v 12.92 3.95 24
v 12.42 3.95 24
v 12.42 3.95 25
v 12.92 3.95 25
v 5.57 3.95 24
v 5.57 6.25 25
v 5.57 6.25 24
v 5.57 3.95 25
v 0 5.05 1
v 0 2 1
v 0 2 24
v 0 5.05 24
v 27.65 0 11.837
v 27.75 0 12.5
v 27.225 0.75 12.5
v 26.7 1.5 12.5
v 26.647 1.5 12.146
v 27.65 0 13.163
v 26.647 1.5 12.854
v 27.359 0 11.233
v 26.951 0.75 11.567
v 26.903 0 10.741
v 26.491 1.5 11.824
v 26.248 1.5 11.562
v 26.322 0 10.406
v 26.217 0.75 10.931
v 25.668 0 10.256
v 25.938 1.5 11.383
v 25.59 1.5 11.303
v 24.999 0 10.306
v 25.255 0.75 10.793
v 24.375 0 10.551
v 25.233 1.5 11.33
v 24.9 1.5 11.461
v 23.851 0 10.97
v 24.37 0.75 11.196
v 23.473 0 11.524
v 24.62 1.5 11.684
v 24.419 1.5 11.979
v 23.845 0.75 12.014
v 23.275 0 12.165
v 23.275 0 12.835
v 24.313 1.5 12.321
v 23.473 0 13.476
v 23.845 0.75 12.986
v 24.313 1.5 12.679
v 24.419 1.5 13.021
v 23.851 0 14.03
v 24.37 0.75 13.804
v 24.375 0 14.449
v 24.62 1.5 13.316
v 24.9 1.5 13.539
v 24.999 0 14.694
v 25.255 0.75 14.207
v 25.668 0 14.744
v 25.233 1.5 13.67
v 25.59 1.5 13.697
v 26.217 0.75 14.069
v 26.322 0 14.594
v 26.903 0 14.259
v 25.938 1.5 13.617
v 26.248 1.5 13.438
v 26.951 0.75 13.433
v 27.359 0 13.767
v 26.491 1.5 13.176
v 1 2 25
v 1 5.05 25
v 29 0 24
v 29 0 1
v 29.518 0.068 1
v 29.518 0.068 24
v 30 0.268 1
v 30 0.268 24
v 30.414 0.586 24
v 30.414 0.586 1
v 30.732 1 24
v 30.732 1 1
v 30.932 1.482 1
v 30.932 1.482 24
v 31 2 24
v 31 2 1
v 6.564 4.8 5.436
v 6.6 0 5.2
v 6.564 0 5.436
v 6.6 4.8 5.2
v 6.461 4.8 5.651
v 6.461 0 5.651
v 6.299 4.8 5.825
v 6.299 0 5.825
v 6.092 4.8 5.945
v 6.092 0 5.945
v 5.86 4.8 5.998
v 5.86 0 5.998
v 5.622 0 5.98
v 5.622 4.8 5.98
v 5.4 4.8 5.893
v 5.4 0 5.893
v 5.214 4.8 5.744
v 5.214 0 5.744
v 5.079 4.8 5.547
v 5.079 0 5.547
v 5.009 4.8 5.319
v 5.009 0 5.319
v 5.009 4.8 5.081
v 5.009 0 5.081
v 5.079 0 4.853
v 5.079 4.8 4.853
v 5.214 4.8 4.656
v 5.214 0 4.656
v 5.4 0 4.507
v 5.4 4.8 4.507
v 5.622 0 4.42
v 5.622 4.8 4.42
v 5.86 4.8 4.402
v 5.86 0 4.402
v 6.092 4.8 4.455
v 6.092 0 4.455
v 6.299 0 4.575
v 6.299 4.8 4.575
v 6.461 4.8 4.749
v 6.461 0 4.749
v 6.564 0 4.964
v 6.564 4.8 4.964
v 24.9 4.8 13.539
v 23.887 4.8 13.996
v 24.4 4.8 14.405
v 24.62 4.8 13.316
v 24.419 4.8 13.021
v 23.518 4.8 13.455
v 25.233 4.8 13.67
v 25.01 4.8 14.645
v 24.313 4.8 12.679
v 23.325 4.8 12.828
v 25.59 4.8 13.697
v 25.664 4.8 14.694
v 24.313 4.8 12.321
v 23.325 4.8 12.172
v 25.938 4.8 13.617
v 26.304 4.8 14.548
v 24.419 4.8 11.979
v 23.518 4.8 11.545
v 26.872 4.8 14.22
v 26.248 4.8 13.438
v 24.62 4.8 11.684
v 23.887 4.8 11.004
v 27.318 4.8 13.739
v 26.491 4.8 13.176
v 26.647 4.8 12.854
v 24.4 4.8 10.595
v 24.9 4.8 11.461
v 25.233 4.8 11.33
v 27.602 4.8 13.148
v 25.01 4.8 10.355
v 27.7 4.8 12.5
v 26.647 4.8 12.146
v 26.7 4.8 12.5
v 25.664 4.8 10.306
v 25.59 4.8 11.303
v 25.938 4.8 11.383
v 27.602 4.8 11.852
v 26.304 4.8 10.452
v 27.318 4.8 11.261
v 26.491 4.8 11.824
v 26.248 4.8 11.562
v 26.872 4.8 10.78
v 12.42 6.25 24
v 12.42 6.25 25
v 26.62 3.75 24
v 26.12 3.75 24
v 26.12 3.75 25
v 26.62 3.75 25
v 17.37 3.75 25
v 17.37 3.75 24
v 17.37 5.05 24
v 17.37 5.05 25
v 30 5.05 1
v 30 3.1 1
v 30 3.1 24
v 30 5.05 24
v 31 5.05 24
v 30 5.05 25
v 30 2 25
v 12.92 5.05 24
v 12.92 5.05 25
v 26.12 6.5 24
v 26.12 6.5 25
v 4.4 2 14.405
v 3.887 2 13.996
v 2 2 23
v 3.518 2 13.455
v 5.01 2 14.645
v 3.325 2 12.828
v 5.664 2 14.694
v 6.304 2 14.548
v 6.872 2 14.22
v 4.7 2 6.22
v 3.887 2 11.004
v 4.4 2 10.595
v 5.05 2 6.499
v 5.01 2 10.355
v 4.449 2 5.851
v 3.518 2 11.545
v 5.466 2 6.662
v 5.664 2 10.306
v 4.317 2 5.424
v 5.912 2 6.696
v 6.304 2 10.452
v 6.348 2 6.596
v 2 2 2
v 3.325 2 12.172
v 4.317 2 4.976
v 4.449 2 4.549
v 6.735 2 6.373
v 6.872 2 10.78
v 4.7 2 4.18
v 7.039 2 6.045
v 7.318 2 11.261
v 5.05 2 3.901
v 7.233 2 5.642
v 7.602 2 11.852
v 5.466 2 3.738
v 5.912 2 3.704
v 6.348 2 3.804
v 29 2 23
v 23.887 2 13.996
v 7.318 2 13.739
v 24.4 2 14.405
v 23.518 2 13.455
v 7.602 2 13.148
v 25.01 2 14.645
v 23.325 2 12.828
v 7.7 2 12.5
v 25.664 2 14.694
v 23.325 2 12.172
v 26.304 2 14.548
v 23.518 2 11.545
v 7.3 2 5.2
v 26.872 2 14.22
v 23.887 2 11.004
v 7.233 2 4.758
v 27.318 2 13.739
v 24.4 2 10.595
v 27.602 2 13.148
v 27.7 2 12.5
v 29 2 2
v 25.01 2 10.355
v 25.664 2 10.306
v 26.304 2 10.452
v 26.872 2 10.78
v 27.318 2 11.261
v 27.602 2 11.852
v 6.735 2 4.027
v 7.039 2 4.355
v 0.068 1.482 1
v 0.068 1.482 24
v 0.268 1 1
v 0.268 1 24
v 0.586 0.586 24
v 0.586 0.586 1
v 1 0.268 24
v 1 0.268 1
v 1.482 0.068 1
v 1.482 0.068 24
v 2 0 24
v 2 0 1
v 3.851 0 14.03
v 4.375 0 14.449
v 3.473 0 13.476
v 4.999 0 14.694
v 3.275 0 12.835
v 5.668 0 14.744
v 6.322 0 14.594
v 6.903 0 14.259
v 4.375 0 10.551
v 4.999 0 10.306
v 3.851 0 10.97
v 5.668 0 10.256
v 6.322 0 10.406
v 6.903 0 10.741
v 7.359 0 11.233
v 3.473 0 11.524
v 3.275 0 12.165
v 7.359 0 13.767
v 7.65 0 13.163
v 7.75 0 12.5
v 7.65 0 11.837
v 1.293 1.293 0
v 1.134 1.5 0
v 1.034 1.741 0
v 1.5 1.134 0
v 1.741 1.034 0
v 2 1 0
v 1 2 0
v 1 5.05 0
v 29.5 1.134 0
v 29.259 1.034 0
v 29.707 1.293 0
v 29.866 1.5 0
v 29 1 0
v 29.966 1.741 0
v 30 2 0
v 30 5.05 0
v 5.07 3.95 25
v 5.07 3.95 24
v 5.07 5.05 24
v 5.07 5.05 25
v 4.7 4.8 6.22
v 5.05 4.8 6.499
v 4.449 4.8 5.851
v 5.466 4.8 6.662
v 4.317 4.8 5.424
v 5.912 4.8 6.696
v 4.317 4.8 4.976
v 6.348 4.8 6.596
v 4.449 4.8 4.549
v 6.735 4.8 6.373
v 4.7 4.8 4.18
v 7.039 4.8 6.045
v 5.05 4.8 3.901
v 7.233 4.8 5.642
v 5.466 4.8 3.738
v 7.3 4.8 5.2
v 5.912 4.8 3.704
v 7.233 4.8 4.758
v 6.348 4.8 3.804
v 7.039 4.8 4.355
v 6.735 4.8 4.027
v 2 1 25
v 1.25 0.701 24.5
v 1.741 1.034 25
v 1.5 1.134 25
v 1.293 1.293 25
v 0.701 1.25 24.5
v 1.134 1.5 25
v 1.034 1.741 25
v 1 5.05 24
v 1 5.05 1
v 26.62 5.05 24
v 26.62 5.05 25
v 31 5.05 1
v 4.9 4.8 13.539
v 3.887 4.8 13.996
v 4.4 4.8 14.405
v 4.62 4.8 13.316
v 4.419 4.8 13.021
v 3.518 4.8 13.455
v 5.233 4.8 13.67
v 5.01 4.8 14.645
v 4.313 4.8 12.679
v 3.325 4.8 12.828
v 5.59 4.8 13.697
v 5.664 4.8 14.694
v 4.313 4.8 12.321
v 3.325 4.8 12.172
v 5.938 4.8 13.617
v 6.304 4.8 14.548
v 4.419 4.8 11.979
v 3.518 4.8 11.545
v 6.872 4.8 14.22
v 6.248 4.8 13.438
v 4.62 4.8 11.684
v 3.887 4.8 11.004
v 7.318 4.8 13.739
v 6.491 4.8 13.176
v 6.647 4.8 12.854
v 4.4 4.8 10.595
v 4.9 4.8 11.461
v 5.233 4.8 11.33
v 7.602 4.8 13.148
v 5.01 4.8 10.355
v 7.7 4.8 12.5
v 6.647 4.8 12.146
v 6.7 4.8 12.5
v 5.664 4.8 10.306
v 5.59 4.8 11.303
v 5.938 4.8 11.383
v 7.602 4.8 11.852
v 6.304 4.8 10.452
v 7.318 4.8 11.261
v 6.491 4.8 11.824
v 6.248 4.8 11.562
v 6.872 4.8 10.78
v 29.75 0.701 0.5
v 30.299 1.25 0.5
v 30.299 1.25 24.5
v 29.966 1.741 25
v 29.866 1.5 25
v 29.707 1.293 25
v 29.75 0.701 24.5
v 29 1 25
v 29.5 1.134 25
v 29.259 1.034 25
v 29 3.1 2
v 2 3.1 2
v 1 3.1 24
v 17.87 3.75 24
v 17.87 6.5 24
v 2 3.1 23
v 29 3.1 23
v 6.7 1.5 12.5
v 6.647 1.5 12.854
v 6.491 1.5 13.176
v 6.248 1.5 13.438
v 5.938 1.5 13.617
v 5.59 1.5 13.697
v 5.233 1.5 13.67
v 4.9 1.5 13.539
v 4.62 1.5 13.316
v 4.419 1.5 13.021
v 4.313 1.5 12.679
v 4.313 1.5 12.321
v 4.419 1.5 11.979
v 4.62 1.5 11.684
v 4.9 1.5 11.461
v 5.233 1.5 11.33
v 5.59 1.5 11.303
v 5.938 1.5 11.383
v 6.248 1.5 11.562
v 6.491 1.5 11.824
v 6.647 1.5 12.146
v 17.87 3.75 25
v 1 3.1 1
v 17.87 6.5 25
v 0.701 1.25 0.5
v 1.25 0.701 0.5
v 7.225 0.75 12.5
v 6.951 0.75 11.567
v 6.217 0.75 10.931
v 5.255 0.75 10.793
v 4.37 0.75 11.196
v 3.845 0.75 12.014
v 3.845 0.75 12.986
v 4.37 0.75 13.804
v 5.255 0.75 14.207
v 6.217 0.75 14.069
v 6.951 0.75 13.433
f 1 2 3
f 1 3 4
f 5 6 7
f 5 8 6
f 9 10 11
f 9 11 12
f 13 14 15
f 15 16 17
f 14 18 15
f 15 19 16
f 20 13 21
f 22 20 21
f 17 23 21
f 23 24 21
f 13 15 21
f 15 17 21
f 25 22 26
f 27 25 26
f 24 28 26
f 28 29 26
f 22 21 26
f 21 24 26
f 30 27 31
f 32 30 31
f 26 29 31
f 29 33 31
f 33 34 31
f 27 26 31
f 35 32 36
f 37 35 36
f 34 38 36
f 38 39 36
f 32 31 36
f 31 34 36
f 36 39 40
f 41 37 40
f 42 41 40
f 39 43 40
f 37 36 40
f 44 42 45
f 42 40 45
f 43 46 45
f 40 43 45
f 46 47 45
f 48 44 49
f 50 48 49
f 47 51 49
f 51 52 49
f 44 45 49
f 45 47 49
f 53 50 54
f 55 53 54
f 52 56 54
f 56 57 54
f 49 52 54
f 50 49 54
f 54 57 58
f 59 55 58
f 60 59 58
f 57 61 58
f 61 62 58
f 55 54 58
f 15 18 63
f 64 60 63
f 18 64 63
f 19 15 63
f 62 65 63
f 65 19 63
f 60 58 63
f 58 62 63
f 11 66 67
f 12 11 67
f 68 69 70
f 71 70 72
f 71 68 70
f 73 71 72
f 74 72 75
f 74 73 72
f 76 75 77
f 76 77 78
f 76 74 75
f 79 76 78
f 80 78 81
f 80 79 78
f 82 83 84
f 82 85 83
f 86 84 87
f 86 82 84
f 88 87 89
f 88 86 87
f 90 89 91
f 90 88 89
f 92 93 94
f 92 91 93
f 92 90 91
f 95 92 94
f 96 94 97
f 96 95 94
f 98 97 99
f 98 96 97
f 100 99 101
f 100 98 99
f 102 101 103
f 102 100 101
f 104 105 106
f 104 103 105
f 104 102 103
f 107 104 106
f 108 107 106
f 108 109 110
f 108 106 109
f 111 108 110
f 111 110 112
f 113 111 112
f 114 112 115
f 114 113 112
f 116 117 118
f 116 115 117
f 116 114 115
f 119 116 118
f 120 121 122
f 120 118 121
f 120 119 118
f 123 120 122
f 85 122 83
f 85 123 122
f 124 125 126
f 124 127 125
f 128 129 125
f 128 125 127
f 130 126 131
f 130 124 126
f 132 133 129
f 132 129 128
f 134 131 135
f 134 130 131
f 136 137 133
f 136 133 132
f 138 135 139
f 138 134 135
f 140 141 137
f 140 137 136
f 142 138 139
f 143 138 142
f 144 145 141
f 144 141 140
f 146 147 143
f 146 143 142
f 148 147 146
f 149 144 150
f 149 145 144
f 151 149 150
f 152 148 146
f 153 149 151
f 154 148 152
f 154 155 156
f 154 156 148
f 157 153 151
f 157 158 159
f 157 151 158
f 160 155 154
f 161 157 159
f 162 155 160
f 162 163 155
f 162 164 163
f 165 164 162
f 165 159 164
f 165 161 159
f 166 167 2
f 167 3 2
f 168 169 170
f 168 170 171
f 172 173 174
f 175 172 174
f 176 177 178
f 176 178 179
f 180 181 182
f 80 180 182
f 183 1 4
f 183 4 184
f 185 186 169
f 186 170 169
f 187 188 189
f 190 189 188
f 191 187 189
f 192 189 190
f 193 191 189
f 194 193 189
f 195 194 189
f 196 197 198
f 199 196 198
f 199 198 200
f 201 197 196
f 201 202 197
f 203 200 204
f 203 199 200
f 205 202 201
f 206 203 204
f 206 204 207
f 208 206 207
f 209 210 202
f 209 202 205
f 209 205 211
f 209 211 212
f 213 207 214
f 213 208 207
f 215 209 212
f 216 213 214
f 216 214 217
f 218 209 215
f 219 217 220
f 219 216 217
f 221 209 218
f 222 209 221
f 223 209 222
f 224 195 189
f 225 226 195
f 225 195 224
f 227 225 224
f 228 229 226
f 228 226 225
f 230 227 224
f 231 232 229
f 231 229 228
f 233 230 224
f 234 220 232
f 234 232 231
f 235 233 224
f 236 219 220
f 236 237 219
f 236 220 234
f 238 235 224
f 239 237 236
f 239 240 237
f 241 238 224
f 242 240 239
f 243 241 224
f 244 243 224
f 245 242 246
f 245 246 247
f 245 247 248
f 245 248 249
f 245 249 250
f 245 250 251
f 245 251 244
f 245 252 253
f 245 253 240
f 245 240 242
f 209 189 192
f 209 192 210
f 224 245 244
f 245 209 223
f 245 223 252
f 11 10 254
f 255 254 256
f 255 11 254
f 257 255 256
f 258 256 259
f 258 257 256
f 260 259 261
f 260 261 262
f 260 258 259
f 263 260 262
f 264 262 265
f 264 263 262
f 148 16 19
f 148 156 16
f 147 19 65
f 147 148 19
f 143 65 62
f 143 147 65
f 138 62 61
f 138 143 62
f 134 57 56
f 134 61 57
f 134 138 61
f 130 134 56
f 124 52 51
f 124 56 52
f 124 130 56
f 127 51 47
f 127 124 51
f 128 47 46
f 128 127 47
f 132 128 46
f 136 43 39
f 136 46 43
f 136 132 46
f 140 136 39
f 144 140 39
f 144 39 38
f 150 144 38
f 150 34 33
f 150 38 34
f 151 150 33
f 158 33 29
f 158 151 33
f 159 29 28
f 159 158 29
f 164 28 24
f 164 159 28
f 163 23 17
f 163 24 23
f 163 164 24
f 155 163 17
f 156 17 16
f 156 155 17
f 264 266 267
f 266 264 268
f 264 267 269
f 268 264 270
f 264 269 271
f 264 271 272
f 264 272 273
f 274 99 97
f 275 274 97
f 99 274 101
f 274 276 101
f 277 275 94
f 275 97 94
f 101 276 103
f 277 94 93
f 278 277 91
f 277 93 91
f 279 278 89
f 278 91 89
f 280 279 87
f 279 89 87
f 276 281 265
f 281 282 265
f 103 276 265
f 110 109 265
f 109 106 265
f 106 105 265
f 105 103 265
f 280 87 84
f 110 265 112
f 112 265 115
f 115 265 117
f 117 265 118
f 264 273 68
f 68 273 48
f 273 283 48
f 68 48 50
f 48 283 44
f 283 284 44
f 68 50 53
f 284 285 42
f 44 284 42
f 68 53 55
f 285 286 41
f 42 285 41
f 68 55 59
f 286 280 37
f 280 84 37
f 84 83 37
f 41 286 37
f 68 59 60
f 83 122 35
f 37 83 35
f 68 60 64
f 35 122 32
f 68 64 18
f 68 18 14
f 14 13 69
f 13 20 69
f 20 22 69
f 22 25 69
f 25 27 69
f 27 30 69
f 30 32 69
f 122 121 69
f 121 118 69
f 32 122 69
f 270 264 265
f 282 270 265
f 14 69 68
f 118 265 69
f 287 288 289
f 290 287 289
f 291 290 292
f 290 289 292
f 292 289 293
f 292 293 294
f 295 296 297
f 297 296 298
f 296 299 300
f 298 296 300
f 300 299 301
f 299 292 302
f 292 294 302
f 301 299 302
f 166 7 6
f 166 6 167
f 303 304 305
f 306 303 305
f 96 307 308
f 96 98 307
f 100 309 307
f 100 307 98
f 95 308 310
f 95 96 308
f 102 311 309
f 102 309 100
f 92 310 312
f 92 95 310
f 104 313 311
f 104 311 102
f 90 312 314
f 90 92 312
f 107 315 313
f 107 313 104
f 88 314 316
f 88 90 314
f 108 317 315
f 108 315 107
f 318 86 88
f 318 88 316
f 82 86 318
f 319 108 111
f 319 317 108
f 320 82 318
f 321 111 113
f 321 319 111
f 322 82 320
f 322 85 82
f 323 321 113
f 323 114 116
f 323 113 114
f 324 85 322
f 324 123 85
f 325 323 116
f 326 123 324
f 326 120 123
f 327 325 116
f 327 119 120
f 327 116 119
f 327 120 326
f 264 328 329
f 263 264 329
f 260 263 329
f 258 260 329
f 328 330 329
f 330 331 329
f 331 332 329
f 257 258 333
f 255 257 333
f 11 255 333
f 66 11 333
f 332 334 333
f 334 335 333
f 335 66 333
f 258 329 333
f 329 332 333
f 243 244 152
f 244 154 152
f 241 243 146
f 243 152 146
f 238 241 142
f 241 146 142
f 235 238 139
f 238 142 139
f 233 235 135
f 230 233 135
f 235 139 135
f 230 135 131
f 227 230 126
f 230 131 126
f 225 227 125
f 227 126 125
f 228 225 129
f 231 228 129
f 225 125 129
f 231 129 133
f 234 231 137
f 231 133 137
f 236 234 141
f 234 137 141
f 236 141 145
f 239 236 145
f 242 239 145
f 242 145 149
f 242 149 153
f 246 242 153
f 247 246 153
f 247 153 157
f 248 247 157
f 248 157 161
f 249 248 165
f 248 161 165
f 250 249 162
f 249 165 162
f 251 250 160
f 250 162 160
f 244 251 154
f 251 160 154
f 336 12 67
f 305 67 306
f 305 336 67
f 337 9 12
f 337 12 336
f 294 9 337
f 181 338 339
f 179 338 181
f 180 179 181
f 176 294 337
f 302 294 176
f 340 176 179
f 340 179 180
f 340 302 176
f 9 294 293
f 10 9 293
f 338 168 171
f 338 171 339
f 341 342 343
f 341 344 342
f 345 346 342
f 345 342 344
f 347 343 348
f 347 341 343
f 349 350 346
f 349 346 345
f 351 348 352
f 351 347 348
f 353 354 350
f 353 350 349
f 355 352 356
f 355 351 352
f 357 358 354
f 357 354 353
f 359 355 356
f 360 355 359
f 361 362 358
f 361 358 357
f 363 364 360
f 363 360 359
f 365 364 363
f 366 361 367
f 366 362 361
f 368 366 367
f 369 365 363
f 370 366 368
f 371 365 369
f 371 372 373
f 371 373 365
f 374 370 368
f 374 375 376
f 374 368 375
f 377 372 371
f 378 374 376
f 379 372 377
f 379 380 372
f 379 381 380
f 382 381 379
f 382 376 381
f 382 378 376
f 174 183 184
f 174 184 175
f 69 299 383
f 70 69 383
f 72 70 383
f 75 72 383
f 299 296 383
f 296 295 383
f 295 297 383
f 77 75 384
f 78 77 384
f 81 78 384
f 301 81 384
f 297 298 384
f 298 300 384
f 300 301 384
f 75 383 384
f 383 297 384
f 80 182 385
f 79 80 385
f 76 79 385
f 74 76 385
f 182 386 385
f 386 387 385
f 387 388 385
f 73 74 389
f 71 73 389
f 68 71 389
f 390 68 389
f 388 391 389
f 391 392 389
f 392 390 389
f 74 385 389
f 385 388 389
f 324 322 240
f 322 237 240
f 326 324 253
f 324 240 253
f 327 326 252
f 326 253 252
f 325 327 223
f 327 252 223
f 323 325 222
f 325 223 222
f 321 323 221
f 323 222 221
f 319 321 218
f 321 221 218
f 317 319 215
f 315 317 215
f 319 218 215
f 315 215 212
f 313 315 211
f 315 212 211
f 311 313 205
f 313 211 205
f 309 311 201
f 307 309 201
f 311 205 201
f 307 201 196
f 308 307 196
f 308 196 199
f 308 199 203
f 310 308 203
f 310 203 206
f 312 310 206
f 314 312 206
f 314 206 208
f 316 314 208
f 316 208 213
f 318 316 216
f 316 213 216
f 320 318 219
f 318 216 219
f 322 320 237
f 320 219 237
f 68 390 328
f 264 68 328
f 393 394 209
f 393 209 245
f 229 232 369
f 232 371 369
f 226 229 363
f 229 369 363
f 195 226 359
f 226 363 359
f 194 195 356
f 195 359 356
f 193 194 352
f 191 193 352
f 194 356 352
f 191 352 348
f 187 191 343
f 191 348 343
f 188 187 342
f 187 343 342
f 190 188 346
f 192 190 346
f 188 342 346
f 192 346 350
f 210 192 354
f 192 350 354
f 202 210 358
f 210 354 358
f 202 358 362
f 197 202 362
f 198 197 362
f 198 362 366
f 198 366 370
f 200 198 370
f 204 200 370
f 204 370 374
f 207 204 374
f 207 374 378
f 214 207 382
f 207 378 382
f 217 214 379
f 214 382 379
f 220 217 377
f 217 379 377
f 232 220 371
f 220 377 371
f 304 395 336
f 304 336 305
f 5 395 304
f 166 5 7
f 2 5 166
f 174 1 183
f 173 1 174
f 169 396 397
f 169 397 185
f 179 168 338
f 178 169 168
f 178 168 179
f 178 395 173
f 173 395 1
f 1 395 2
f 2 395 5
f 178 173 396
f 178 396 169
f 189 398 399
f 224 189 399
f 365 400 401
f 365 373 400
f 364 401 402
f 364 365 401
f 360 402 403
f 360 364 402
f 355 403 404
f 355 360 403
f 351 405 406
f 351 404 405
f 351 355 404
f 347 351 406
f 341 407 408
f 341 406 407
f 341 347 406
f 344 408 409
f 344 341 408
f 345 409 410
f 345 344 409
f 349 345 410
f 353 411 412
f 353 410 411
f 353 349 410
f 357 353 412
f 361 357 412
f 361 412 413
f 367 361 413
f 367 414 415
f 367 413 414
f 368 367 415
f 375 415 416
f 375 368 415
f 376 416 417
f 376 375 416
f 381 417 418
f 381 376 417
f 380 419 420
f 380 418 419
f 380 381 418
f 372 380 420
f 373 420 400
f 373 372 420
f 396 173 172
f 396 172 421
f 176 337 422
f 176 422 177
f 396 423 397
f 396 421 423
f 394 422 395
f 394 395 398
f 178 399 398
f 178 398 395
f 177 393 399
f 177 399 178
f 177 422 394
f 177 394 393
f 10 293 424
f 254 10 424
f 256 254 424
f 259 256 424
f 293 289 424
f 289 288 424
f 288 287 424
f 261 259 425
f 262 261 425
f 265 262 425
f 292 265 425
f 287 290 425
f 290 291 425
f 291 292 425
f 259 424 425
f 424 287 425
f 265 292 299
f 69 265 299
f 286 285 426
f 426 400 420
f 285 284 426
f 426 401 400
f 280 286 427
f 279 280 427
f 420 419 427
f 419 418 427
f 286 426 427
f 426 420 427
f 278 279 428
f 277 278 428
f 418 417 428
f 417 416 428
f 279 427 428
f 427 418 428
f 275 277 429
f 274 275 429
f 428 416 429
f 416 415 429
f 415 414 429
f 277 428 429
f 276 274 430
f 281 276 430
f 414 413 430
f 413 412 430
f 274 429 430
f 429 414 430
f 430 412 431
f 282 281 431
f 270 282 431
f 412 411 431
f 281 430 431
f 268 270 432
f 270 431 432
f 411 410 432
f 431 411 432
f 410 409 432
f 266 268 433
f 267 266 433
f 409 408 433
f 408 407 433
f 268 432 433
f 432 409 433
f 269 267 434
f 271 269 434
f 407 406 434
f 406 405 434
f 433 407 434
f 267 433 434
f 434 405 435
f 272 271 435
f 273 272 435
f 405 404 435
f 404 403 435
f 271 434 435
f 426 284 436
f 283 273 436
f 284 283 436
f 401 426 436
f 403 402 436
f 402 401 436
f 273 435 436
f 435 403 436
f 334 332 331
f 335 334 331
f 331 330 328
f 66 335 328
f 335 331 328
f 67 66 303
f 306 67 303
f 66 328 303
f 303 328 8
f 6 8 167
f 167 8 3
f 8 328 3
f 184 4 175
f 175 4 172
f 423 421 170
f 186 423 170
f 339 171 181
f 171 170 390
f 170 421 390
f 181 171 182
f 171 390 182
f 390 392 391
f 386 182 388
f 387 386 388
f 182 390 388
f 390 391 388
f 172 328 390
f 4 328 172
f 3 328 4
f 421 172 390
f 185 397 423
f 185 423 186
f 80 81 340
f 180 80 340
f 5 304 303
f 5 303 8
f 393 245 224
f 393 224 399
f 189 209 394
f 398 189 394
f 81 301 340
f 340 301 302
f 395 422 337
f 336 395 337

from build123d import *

# Parameters (mm, degrees)
FACE004_W          = 8.25
FACE004_H          = 1
EXTRUSION003_DEPTH = 0.2
FACE005_W          = 6.85
FACE005_H          = 1
EXTRUSION004_DEPTH = 0.2
BOX008_W           = 8.25
BOX008_H           = 2.55
BOX008_DEPTH       = 1
BOX009_W           = 6.85
BOX009_H           = 2.1
BOX009_DEPTH       = 1
BOX007_W           = 7.85
BOX007_H           = 2.1
BOX007_DEPTH       = 10
BOX006_W           = 9.25
BOX006_H           = 2.55
BOX006_DEPTH       = 10
BOX003_W           = 27
BOX003_H           = 1.5
BOX003_DEPTH       = 21
BOX002_W           = 29
BOX002_H           = 1.5
BOX002_DEPTH       = 23
CYLINDER004_R      = 0.8
CYLINDER004_DEPTH  = 20.6
CYLINDER002_R      = 1.2
CYLINDER002_DEPTH  = 10.6
CYLINDER001_R      = 1.2
CYLINDER001_DEPTH  = 10.6
CYLINDER003_R      = 2.2
CYLINDER003_DEPTH  = 2.6
BOX001_W           = 27
BOX001_H           = 2.6
BOX001_DEPTH       = 21
BOX_W              = 31
BOX_H              = 4.6
BOX_DEPTH          = 25
CYLINDER_R         = 2.2
CYLINDER_DEPTH     = 2.6
CYLINDER005_R      = 1.5
CYLINDER005_DEPTH  = 2.6
BOX005_W           = 29
BOX005_H           = 0.45
BOX005_DEPTH       = 23
BOX004_W           = 31
BOX004_H           = 0.45
BOX004_DEPTH       = 25
FILLET_R           = 2
CHAMFER_SIZE       = 1
FACE001_R          = 2.2
FACE001_R_2        = 1.2
EXTRUSION001_DEPTH = 0.2
FACE003_R          = 1.5
FACE003_R_2        = 0.8
EXTRUSION002_DEPTH = 0.2
FACE_R             = 2.2
FACE_R_2           = 1.2
EXTRUSION_DEPTH    = 0.2


with BuildPart() as extrusion003:
    # Face004 → Extrusion003 (new body)
    with BuildSketch(Plane(origin=(21.995, 6.3, 24.5), x_dir=(1, 0, 0), z_dir=(0, 1, 0))):
        Rectangle(FACE004_W, FACE004_H)
    extrude(amount=EXTRUSION003_DEPTH)


with BuildPart() as extrusion004:
    # Face005 → Extrusion004 (new body)
    with BuildSketch(Plane(origin=(8.995, 6.05, 24.5), x_dir=(1, 0, 0), z_dir=(0, 1, 0))):
        Rectangle(FACE005_W, FACE005_H)
    extrude(amount=EXTRUSION004_DEPTH)


with BuildPart() as typec_cutoff:
    # Box008 → Box008 (new body)
    with BuildSketch(Plane(origin=(17.87, 3.75, 24), x_dir=(1, 0, 0), z_dir=(0, 0, 1))):
        with Locations((4.125, 1.275)):
            Rectangle(BOX008_W, BOX008_H)
    extrude(amount=BOX008_DEPTH)


with BuildPart() as micro_cutoff:
    # Box009 → Box009 (new body)
    with BuildSketch(Plane(origin=(5.57, 3.95, 24), x_dir=(1, 0, 0), z_dir=(0, 0, 1))):
        with Locations((3.425, 1.05)):
            Rectangle(BOX009_W, BOX009_H)
    extrude(amount=BOX009_DEPTH)


with BuildPart() as countersunkleft:
    # Cone → Cone (revolve)
    with BuildSketch(Plane(origin=(5.5, 0, 12.5), x_dir=(1, 0, 0), z_dir=(0, 0, 1))):
        Polygon((0, 0), (2.25, 0), (1.2, 1.5), (0, 1.5), align=None)
    revolve(axis=Axis((5.5, 0, 12.5), (0, 1, 0)))


with BuildPart() as countersunk:
    # Cone001 → Cone001 (revolve)
    with BuildSketch(Plane(origin=(25.5, 0, 12.5), x_dir=(1, 0, 0), z_dir=(0, 0, 1))):
        Polygon((0, 0), (2.25, 0), (1.2, 1.5), (0, 1.5), align=None)
    revolve(axis=Axis((25.5, 0, 12.5), (0, 1, 0)))

    # Fusion005: union counterSunkLeft
    add(countersunkleft.part)


with BuildPart() as micro_cutout:
    # Box007 → Box007 (new body)
    with BuildSketch(Plane(origin=(5.07, 3.95, 20), x_dir=(1, 0, 0), z_dir=(0, 0, 1))):
        with Locations((3.925, 1.05)):
            Rectangle(BOX007_W, BOX007_H)
    extrude(amount=BOX007_DEPTH)


with BuildPart() as connector_cutouts:
    # Box006 → Box006 (new body)
    with BuildSketch(Plane(origin=(17.37, 3.75, 19), x_dir=(1, 0, 0), z_dir=(0, 0, 1))):
        with Locations((4.625, 1.275)):
            Rectangle(BOX006_W, BOX006_H)
    extrude(amount=BOX006_DEPTH)

    # Fusion006: union Micro_cutout
    add(micro_cutout.part)


with BuildPart() as cube001:
    # Box003 → Box003 (new body)
    with BuildSketch(Plane(origin=(2, 3.1, 2), x_dir=(1, 0, 0), z_dir=(0, 0, 1))):
        with Locations((13.5, 0.75)):
            Rectangle(BOX003_W, BOX003_H)
    extrude(amount=BOX003_DEPTH)


with BuildPart() as cut004:
    # Box002 → Box002 (new body)
    with BuildSketch(Plane(origin=(1, 3.1, 1), x_dir=(1, 0, 0), z_dir=(0, 0, 1))):
        with Locations((14.5, 0.75)):
            Rectangle(BOX002_W, BOX002_H)
    extrude(amount=BOX002_DEPTH)

    # Cut004: cut Cube001
    add(cube001.part, mode=Mode.SUBTRACT)


with BuildPart() as bootloaderhole:
    # Cylinder004 → Cylinder004 (new body)
    with BuildSketch(Plane(origin=(5.8, 12, 5.2), x_dir=(1, 0, 0), z_dir=(0, -1, 0))):
        Circle(CYLINDER004_R)
    extrude(amount=CYLINDER004_DEPTH)


with BuildPart() as pcbholderhole001:
    # Cylinder002 → Cylinder002 (new body)
    with BuildSketch(Plane(origin=(5.5, 4.6, 12.5), x_dir=(1, 0, 0), z_dir=(0, -1, 0))):
        Circle(CYLINDER002_R)
    extrude(amount=CYLINDER002_DEPTH)


with BuildPart() as pcbholes:
    # Cylinder001 → Cylinder001 (new body)
    with BuildSketch(Plane(origin=(25.5, 4.6, 12.5), x_dir=(1, 0, 0), z_dir=(0, -1, 0))):
        Circle(CYLINDER001_R)
    extrude(amount=CYLINDER001_DEPTH)

    # Fusion001: union pcbHolderHole001
    add(pcbholderhole001.part)


with BuildPart() as pcbholder001:
    # Cylinder003 → Cylinder003 (new body)
    with BuildSketch(Plane(origin=(5.5, 4.6, 12.5), x_dir=(1, 0, 0), z_dir=(0, -1, 0))):
        Circle(CYLINDER003_R)
    extrude(amount=CYLINDER003_DEPTH)


with BuildPart() as innercut:
    # Box001 → Box001 (new body)
    with BuildSketch(Plane(origin=(2, 2, 2), x_dir=(1, 0, 0), z_dir=(0, 0, 1))):
        with Locations((13.5, 1.3)):
            Rectangle(BOX001_W, BOX001_H)
    extrude(amount=BOX001_DEPTH)


with BuildPart() as cut:
    # Box → Box (new body)
    with BuildSketch(Plane.XY):
        with Locations((15.5, 2.3)):
            Rectangle(BOX_W, BOX_H)
    extrude(amount=BOX_DEPTH)

    # Cut: cut innerCut
    add(innercut.part, mode=Mode.SUBTRACT)


with BuildPart() as casewithholes:
    # Cylinder → Cylinder (new body)
    with BuildSketch(Plane(origin=(25.5, 4.6, 12.5), x_dir=(1, 0, 0), z_dir=(0, -1, 0))):
        Circle(CYLINDER_R)
    extrude(amount=CYLINDER_DEPTH)

    # Fusion: union pcbHolder001, Cut
    add(pcbholder001.part)
    add(cut.part)

    # Cut001: cut pcbHoles
    add(pcbholes.part, mode=Mode.SUBTRACT)


with BuildPart() as cut009:
    # Cylinder005 → Cylinder005 (new body)
    with BuildSketch(Plane(origin=(5.8, 4.6, 5.2), x_dir=(1, 0, 0), z_dir=(0, -1, 0))):
        Circle(CYLINDER005_R)
    extrude(amount=CYLINDER005_DEPTH)

    # Fusion002: union caseWithHoles
    add(casewithholes.part)

    # Cut002: cut bootloaderHole
    add(bootloaderhole.part, mode=Mode.SUBTRACT)

    # Cut009: cut Cut004
    add(cut004.part, mode=Mode.SUBTRACT)


with BuildPart() as cube003:
    # Box005 → Box005 (new body)
    with BuildSketch(Plane(origin=(1, 4.6, 1), x_dir=(1, 0, 0), z_dir=(0, 0, 1))):
        with Locations((14.5, 0.225)):
            Rectangle(BOX005_W, BOX005_H)
    extrude(amount=BOX005_DEPTH)


with BuildPart() as chamfer_body:
    # Box004 → Box004 (new body)
    with BuildSketch(Plane(origin=(0, 4.6, 0), x_dir=(1, 0, 0), z_dir=(0, 0, 1))):
        with Locations((15.5, 0.225)):
            Rectangle(BOX004_W, BOX004_H)
    extrude(amount=BOX004_DEPTH)

    # Cut006: cut Cube003
    add(cube003.part, mode=Mode.SUBTRACT)

    # Fusion004: union Cut009
    add(cut009.part)

    # Cut010: cut connector_cutouts
    add(connector_cutouts.part, mode=Mode.SUBTRACT)

    # Cut011: cut counterSunk
    add(countersunk.part, mode=Mode.SUBTRACT)

    # Fusion007: union TypeC_cutoff, Micro_cutoff
    add(typec_cutoff.part)
    add(micro_cutoff.part)

    # Fillet
    fillet_edges = [chamfer_body.edges().sort_by_distance(p)[0] for p in [
        (0, 0, 12.5),
        (31, 0, 12.5),
    ]]
    fillet(fillet_edges, radius=FILLET_R)

    # Chamfer
    chamfer_edges = [chamfer_body.edges().sort_by_distance(p)[0] for p in [
        (0, 3.3, 25),
        (0, 3.3, 0),
        (0.585786, 0.585786, 25),
        (15.5, 0, 25),
        (30.414214, 0.585786, 25),
        (31, 3.3, 25),
        (0.585786, 0.585786, 0),
        (0, 4.825, 25),
        (0, 4.825, 0),
        (15.5, 0, 0),
        (31, 3.3, 0),
        (30.414214, 0.585786, 0),
        (31, 4.825, 25),
        (31, 4.825, 0),
    ]]
    chamfer(chamfer_edges, length=CHAMFER_SIZE)


with BuildPart() as extrusion001:
    # Face001 → Extrusion001 (new body)
    with BuildSketch(Plane(origin=(5.5, 4.6, 12.5), x_dir=(1, 0, 0), z_dir=(0, 1, 0))):
        Circle(FACE001_R)
        Circle(FACE001_R_2, mode=Mode.SUBTRACT)
    extrude(amount=EXTRUSION001_DEPTH)


with BuildPart() as extrusion002:
    # Face003 → Extrusion002 (new body)
    with BuildSketch(Plane(origin=(5.8, 4.6, 5.2), x_dir=(1, 0, 0), z_dir=(0, 1, 0))):
        Circle(FACE003_R)
        Circle(FACE003_R_2, mode=Mode.SUBTRACT)
    extrude(amount=EXTRUSION002_DEPTH)


with BuildPart() as fusion010:
    # Face → Extrusion (new body)
    with BuildSketch(Plane(origin=(25.5, 4.6, 12.5), x_dir=(1, 0, 0), z_dir=(0, 1, 0))):
        Circle(FACE_R)
        Circle(FACE_R_2, mode=Mode.SUBTRACT)
    extrude(amount=EXTRUSION_DEPTH)

    # Fusion008: union Extrusion001, Extrusion002
    add(extrusion001.part)
    add(extrusion002.part)

    # Fusion009: union Chamfer body
    add(chamfer_body.part)

    # Fusion010: union Extrusion003, Extrusion004
    add(extrusion003.part)
    add(extrusion004.part)


solid = fusion010.part
